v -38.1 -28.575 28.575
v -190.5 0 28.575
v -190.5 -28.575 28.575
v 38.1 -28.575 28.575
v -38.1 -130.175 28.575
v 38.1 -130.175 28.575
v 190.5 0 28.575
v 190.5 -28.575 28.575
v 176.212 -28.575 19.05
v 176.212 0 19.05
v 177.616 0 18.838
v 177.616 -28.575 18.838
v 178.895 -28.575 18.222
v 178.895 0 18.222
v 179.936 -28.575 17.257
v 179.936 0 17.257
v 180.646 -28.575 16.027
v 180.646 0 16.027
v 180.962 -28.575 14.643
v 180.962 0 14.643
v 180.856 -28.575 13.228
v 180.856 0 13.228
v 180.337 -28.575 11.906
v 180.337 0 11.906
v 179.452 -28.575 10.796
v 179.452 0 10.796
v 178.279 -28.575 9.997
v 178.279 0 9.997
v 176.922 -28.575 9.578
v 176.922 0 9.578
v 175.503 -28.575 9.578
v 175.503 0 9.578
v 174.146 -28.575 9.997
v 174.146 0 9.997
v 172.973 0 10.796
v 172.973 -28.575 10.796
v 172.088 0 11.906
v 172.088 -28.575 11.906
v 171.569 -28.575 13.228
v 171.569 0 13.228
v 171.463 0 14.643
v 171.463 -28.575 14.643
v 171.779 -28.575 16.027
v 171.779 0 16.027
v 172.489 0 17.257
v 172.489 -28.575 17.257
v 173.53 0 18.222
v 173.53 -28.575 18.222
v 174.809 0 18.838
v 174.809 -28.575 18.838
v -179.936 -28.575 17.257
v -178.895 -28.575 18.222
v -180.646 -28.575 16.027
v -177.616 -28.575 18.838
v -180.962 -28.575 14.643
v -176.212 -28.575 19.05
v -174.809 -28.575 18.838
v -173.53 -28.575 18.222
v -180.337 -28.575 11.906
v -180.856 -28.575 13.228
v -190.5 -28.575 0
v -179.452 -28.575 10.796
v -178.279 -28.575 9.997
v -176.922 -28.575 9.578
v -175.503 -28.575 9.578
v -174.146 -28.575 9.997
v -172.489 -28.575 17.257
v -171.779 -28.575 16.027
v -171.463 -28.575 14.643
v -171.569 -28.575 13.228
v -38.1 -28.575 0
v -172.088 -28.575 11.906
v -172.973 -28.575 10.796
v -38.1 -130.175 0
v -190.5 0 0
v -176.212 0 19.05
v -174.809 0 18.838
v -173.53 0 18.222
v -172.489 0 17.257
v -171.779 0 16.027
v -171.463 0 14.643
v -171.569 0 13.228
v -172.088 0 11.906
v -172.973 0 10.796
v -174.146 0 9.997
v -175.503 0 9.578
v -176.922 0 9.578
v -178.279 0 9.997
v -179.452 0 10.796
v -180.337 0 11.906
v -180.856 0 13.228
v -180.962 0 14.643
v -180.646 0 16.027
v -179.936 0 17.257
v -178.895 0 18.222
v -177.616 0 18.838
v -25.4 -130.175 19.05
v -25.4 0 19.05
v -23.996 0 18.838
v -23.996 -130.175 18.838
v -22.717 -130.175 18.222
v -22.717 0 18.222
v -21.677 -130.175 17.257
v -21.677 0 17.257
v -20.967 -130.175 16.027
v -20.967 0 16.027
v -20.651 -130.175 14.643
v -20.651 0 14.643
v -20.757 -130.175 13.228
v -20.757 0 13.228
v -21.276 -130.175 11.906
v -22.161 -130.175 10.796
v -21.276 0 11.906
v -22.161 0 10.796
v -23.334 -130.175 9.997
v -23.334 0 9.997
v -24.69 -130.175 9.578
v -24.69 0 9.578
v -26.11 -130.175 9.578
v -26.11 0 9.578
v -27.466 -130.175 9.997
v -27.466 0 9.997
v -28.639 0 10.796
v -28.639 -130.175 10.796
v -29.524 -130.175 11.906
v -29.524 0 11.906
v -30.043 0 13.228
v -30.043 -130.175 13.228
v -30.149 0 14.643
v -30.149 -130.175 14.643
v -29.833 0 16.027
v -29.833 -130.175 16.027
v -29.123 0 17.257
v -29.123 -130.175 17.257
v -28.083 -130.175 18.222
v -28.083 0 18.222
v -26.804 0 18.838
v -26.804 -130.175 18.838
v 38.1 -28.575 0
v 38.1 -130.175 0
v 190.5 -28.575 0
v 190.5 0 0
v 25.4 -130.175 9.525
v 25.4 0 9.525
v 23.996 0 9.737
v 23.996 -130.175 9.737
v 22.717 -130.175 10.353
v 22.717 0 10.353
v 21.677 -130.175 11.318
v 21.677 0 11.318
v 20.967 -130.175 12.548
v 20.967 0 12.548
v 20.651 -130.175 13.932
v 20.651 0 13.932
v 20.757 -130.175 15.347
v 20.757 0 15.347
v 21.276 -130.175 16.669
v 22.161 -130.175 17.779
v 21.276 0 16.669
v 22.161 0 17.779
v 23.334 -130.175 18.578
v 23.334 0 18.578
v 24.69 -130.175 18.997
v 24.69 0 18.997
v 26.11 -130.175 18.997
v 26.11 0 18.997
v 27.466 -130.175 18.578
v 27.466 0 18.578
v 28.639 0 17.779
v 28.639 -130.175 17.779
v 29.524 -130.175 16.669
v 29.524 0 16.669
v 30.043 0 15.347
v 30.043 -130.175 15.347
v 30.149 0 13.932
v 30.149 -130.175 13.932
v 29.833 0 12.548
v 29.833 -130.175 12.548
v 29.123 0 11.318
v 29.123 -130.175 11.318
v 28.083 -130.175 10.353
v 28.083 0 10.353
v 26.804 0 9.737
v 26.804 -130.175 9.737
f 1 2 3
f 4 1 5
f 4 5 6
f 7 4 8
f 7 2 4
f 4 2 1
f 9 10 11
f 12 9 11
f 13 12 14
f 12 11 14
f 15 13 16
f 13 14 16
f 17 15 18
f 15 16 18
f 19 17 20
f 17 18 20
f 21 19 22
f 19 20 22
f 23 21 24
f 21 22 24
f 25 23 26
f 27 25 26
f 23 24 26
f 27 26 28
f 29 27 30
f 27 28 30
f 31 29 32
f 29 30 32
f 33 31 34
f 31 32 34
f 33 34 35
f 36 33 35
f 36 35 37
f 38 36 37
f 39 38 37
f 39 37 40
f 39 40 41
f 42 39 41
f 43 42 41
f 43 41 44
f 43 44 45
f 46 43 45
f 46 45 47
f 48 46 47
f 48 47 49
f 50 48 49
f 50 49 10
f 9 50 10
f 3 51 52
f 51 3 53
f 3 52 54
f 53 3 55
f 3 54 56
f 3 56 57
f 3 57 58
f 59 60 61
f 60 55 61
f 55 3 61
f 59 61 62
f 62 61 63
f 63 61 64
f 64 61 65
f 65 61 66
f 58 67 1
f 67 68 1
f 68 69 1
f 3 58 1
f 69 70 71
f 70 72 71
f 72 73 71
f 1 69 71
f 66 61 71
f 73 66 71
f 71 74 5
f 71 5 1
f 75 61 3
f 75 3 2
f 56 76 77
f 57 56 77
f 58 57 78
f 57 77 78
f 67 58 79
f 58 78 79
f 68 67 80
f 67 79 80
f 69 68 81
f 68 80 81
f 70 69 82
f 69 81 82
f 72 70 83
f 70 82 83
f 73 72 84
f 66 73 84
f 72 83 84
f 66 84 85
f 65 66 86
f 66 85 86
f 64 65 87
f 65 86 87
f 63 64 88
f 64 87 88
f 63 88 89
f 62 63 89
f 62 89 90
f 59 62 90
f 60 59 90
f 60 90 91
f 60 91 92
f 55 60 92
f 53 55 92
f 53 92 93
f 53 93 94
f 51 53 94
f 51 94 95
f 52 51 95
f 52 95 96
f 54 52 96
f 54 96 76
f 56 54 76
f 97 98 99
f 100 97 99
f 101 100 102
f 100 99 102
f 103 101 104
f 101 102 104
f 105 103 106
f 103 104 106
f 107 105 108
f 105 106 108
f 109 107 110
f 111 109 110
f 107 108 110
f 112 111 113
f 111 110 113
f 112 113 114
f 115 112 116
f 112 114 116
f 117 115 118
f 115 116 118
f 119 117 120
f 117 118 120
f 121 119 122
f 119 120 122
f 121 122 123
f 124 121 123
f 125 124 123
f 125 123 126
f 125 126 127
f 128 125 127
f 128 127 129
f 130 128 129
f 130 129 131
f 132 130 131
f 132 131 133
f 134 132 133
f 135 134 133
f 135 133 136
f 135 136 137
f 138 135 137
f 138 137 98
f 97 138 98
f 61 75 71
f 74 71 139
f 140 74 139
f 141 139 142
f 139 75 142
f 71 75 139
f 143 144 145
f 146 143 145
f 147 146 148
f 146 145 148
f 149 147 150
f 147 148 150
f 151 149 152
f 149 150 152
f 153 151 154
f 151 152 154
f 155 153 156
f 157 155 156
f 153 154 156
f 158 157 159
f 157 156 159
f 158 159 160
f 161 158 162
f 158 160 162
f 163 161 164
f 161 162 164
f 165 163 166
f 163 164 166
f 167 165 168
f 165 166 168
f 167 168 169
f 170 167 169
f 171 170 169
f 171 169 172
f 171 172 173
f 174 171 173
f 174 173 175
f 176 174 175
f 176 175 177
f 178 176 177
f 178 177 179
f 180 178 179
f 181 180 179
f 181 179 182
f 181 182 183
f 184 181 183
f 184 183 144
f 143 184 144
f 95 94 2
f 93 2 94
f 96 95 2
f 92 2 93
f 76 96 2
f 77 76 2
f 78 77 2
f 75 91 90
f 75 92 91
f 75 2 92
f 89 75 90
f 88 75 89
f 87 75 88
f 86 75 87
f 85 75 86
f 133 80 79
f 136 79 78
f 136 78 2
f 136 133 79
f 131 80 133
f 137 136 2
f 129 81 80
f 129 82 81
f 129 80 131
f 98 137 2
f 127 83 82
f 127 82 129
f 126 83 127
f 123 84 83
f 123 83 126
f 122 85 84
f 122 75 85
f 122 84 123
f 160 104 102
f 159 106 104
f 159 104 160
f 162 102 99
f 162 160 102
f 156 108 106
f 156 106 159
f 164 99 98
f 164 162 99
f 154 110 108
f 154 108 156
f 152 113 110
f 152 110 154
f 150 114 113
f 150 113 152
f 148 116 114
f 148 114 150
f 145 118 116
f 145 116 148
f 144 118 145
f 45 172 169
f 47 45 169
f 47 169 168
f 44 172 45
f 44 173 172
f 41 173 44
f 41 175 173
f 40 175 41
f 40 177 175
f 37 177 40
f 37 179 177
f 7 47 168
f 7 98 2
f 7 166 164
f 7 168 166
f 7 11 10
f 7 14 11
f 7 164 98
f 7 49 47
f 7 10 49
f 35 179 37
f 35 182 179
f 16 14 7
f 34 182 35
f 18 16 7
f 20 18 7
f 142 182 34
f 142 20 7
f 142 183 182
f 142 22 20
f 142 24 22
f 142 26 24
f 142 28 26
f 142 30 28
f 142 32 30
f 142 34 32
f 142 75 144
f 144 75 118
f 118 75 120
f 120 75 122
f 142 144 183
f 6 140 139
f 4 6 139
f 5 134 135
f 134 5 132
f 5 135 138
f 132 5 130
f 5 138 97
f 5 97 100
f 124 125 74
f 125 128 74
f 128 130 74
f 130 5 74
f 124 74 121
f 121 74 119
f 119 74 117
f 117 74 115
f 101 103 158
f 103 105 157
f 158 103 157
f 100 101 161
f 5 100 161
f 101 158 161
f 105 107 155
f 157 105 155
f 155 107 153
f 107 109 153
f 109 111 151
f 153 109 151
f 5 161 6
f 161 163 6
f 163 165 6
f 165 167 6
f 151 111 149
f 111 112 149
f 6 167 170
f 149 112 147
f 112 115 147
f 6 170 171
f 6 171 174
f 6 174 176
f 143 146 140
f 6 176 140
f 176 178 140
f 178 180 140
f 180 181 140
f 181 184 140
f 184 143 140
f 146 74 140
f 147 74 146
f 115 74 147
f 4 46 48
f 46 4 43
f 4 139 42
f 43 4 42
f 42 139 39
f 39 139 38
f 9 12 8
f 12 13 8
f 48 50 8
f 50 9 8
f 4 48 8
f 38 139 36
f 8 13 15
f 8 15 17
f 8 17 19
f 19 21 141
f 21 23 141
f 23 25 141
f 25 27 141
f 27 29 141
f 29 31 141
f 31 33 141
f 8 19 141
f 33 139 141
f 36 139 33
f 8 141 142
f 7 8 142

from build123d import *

# Parameters (mm, degrees)
SKETCH1_W           = 381
SKETCH1_H           = 28.575
SKETCH1_W_2         = 76.2
SKETCH1_H_2         = 101.6
BOSS_EXTRUDE1_DEPTH = 28.575
SKETCH2_R           = 4.7625
CUT_EXTRUDE1_DEPTH  = 233.491529416


with BuildPart() as part:
    # Sketch1 → Boss-Extrude1 (new body)
    with BuildSketch(Plane.XY):
        with Locations((0, -14.2875)):
            Rectangle(SKETCH1_W, SKETCH1_H)
        with Locations((0, -79.375)):
            Rectangle(SKETCH1_W_2, SKETCH1_H_2)
    extrude(amount=BOSS_EXTRUDE1_DEPTH)

    # Sketch2 → Cut-Extrude1 (cut, through all)
    with BuildSketch(Plane(origin=(0, 0, 0), x_dir=(1, 0, 0), z_dir=(0, 1, 0))):
        with Locations(Location((-176.2125, -14.2875, 0), (0, 0, 270))):
            Circle(SKETCH2_R)
        with Locations(Location((-25.4, -14.2875, 0), (0, 0, 270))):
            Circle(SKETCH2_R)
        with Locations(Location((25.4, -14.2875, 0), (0, 0, 90))):
            Circle(SKETCH2_R)
        with Locations(Location((176.2125, -14.2875, 0), (0, 0, 270))):
            Circle(SKETCH2_R)
    extrude(amount=-CUT_EXTRUDE1_DEPTH, mode=Mode.SUBTRACT)


solid = part.part
